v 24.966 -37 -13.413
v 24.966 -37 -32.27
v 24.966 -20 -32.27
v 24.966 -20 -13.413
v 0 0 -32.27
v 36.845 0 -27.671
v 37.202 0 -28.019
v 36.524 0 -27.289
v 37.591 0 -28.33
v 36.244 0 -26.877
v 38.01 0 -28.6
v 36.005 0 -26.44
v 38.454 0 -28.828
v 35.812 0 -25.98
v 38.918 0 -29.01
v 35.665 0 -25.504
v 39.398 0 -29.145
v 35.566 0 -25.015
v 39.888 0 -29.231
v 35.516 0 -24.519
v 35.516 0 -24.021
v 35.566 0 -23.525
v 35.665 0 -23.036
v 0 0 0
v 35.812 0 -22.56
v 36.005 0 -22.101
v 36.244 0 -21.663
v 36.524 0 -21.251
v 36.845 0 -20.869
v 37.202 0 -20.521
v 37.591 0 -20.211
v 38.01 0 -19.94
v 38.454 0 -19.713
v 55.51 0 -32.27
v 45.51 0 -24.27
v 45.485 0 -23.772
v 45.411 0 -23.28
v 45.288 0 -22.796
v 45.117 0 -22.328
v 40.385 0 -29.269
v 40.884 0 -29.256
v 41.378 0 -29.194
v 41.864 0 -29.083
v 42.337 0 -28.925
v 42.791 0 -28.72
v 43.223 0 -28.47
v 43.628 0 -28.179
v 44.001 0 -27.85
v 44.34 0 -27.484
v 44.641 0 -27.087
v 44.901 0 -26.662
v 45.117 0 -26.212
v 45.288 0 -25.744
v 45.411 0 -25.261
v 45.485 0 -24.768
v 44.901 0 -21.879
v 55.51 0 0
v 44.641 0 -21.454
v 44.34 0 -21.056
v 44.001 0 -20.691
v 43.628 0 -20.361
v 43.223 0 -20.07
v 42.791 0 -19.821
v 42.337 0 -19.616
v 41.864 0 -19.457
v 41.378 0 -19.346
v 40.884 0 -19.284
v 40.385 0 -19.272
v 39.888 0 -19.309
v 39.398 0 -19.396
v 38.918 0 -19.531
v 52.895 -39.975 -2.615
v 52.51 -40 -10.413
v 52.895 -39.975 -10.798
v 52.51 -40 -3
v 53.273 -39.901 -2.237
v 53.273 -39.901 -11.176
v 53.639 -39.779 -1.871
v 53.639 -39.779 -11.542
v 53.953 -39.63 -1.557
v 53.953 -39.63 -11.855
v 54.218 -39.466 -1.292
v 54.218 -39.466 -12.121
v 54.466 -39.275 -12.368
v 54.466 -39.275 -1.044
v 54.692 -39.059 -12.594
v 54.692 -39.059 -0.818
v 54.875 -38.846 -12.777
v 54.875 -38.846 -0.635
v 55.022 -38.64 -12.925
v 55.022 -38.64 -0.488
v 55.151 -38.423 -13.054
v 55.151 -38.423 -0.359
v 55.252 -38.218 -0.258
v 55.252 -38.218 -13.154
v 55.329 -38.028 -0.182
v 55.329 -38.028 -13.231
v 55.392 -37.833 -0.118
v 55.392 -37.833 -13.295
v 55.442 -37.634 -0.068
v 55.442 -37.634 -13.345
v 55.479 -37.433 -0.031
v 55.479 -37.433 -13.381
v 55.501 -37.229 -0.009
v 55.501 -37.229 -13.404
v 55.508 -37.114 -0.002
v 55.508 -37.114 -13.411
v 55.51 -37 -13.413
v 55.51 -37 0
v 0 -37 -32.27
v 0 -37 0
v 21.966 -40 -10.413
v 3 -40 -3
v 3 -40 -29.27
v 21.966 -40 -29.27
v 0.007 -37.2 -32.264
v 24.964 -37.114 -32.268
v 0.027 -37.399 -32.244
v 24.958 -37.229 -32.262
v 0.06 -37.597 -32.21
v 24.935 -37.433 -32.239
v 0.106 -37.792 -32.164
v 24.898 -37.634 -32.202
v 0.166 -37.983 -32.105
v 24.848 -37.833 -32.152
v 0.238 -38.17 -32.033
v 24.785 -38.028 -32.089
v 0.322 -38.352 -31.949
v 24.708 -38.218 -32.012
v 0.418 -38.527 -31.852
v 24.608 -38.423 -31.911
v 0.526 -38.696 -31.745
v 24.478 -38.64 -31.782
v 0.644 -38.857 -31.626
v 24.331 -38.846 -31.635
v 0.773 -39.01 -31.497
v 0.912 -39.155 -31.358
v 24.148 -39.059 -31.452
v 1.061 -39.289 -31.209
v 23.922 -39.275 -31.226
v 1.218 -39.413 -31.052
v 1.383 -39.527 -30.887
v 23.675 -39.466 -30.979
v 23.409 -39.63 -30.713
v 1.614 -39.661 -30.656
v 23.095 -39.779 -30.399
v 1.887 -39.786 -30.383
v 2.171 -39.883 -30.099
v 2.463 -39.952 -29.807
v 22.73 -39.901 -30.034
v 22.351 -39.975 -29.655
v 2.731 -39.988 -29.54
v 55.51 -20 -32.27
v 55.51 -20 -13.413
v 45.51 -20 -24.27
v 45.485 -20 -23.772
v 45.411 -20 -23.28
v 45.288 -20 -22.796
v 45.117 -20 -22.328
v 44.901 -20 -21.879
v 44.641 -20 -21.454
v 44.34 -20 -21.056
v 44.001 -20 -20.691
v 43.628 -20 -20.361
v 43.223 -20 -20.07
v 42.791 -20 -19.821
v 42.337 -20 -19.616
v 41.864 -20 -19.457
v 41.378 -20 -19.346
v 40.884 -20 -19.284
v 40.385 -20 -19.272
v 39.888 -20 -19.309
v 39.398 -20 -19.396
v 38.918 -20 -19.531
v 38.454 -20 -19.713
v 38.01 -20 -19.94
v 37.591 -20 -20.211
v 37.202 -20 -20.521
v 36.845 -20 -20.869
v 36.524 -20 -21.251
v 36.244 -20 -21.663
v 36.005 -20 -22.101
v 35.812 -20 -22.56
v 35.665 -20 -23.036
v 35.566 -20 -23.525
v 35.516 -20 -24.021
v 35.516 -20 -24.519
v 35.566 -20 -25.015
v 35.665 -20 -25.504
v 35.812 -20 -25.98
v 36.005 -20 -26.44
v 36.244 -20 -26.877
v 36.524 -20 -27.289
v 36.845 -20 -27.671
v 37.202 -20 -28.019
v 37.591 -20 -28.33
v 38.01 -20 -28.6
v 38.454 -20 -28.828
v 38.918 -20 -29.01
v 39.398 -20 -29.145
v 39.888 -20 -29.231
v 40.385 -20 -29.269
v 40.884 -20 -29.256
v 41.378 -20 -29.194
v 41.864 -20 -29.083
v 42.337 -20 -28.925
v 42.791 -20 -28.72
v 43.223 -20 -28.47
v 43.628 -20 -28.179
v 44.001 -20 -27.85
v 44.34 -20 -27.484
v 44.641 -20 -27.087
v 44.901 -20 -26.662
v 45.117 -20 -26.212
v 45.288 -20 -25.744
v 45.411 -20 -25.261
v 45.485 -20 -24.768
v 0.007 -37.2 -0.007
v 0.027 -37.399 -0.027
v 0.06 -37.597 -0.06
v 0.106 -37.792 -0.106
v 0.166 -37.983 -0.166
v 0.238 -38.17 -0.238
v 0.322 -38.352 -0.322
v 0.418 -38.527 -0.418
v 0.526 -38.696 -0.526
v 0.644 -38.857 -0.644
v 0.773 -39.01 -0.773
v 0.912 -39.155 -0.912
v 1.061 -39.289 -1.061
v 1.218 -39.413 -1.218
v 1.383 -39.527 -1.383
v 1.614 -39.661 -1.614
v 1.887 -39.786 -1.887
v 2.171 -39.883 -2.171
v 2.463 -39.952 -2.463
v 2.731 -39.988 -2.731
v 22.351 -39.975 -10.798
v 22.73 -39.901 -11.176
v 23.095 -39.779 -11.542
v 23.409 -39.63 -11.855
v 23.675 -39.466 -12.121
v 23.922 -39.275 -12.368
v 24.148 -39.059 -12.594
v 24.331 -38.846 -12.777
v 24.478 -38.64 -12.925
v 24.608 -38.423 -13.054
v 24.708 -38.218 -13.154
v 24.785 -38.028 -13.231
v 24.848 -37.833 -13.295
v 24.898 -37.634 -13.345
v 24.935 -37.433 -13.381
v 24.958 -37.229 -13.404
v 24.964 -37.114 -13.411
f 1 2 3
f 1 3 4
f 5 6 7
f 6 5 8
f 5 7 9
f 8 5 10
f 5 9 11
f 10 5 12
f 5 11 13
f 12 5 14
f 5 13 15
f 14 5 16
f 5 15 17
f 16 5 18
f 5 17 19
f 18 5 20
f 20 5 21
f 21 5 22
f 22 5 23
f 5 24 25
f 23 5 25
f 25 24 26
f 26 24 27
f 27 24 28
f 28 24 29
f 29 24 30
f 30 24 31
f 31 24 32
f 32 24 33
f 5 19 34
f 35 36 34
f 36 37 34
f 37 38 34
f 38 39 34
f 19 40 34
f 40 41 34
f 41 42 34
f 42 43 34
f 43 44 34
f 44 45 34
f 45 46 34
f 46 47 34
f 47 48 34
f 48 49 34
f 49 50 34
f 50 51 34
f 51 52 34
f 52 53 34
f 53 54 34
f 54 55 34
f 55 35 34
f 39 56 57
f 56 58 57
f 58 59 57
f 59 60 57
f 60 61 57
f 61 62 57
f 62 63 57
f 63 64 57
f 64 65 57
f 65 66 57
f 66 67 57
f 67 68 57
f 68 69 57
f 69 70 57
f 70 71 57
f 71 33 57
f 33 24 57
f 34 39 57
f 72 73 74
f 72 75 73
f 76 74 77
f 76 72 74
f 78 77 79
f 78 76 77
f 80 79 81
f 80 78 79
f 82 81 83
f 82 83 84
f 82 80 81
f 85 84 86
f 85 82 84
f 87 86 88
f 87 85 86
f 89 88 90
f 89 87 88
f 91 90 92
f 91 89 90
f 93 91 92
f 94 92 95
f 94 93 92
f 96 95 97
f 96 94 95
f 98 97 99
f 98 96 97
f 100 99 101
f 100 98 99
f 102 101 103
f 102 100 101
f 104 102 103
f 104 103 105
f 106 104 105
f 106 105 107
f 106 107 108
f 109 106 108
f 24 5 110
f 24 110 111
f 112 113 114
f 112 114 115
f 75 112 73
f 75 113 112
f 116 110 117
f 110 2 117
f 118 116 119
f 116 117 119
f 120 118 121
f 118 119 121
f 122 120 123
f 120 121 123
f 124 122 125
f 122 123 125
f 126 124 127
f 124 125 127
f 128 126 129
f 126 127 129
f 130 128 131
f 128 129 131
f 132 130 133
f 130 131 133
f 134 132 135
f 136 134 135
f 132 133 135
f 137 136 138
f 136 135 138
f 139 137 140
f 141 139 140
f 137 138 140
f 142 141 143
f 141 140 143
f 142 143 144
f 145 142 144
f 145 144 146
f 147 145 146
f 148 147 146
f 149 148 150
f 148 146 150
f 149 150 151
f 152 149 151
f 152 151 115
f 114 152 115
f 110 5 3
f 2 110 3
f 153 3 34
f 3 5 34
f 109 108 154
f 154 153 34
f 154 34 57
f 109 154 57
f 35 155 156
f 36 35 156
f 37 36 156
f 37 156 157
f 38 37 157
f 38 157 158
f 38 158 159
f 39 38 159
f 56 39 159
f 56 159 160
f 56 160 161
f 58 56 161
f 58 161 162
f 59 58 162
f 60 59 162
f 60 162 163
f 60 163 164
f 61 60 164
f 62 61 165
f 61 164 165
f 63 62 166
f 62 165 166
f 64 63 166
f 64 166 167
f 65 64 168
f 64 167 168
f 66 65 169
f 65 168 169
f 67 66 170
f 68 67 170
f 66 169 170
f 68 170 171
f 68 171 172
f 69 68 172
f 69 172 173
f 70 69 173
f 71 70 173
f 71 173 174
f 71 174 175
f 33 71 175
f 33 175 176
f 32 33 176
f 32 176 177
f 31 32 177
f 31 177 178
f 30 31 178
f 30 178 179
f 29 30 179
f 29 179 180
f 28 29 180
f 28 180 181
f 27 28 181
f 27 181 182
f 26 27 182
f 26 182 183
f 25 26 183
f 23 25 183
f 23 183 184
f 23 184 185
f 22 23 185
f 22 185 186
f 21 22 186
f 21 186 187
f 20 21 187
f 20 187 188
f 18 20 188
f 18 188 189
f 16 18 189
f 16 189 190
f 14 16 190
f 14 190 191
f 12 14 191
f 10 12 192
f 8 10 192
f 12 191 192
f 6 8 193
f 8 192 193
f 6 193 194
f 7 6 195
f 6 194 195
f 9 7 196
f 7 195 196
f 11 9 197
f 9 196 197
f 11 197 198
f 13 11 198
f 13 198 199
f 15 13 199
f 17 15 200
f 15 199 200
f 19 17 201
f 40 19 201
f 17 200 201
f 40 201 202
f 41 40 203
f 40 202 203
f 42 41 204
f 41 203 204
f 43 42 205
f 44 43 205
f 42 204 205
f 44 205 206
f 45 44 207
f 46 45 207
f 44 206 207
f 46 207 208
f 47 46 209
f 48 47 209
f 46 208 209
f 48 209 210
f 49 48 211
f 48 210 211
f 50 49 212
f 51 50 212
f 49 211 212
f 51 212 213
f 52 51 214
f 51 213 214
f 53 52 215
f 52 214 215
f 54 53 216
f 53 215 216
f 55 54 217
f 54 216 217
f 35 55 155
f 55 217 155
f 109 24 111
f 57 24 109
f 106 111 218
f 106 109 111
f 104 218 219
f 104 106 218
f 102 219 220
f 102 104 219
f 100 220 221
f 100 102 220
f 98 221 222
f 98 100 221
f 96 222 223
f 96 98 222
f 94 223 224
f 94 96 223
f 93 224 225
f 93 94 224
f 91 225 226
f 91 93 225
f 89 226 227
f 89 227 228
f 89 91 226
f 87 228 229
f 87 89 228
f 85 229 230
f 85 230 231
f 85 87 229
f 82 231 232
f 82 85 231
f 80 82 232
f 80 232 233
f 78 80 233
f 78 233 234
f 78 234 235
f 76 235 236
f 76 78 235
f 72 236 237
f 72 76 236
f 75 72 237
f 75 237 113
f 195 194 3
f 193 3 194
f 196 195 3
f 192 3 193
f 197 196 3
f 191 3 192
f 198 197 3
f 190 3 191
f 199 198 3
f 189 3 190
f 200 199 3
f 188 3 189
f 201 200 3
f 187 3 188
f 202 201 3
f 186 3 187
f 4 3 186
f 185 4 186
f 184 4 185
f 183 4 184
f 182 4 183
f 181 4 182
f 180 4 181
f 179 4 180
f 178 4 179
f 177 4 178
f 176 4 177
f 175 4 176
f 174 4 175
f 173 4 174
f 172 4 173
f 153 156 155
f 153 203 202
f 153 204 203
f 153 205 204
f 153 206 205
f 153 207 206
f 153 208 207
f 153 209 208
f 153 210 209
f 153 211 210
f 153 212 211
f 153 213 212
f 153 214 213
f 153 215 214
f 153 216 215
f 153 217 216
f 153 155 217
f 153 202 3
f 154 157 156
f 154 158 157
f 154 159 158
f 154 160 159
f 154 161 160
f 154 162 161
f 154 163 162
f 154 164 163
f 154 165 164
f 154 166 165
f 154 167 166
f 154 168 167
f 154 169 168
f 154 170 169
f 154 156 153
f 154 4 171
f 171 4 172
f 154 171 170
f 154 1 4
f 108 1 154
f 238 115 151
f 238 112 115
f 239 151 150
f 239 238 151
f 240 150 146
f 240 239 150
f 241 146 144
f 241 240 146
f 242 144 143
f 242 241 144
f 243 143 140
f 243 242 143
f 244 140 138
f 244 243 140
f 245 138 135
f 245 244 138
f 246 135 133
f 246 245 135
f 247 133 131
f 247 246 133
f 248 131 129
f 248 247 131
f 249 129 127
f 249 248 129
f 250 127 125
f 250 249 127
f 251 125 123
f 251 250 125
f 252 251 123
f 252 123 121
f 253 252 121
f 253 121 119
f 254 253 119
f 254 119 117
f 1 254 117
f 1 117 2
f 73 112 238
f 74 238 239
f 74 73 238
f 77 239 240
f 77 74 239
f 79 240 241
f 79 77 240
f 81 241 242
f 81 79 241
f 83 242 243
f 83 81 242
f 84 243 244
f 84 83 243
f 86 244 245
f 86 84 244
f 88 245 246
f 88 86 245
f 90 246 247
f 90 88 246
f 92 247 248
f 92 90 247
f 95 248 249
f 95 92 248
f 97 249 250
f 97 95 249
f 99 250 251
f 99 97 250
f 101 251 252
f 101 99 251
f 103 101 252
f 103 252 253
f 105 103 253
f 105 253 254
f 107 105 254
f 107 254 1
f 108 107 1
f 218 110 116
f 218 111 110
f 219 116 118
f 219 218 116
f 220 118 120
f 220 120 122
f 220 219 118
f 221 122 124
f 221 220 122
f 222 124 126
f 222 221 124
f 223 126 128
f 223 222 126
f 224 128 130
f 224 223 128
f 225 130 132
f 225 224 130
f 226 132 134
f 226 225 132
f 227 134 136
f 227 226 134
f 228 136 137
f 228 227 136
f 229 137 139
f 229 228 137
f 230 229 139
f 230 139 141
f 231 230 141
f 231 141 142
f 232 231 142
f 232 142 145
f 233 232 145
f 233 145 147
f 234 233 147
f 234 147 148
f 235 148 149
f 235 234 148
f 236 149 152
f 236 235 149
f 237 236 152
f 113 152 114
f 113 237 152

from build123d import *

# Parameters (mm, degrees)
F0_W     = 55.5101186037
F0_H     = 32.2702378035
F1_DEPTH = 40
F2_W     = 30.5438451469
F2_H     = 18.8575051725
F3_DEPTH = 20
F4_R     = 5
F5_DEPTH = 20.001
F7_R     = 3


# Not quite as in the source:
# - a feature of the source that left no trace in its solid (it failed there, or was rolled back) is left out


with BuildPart() as f1:
    # F0 (on Front) → F1 (new body)
    with BuildSketch(Plane.XZ):
        with Locations((27.7550593019, -16.1351189017)):
            Rectangle(F0_W, F0_H)
    extrude(amount=F1_DEPTH)

    # F2 (on face) → F3 (cut)
    with BuildSketch(Plane.XZ.offset(40)):
        with Locations((40.2381960303, -22.8414852172)):
            Rectangle(F2_W, F2_H)
    extrude(amount=-F3_DEPTH, mode=Mode.SUBTRACT)

    # F4 (on face) → F5 (cut, through all)
    with BuildSketch(Plane.XZ.offset(20)):
        with Locations((40.5101186037, -24.2702378035)):
            Circle(F4_R)
    extrude(amount=-F5_DEPTH, mode=Mode.SUBTRACT)

    # F7
    f7_edges = [f1.edges().sort_by_distance(p)[0] for p in [
        (24.966273, -40, -22.841485),
        (0, -40, -16.135119),
        (12.483137, -40, -32.270238),
        (40.238196, -40, -13.412733),
        (55.510119, -40, -6.706366),
        (27.755059, -40, 0),
    ]]
    fillet(f7_edges, radius=F7_R)


solid = f1.part
